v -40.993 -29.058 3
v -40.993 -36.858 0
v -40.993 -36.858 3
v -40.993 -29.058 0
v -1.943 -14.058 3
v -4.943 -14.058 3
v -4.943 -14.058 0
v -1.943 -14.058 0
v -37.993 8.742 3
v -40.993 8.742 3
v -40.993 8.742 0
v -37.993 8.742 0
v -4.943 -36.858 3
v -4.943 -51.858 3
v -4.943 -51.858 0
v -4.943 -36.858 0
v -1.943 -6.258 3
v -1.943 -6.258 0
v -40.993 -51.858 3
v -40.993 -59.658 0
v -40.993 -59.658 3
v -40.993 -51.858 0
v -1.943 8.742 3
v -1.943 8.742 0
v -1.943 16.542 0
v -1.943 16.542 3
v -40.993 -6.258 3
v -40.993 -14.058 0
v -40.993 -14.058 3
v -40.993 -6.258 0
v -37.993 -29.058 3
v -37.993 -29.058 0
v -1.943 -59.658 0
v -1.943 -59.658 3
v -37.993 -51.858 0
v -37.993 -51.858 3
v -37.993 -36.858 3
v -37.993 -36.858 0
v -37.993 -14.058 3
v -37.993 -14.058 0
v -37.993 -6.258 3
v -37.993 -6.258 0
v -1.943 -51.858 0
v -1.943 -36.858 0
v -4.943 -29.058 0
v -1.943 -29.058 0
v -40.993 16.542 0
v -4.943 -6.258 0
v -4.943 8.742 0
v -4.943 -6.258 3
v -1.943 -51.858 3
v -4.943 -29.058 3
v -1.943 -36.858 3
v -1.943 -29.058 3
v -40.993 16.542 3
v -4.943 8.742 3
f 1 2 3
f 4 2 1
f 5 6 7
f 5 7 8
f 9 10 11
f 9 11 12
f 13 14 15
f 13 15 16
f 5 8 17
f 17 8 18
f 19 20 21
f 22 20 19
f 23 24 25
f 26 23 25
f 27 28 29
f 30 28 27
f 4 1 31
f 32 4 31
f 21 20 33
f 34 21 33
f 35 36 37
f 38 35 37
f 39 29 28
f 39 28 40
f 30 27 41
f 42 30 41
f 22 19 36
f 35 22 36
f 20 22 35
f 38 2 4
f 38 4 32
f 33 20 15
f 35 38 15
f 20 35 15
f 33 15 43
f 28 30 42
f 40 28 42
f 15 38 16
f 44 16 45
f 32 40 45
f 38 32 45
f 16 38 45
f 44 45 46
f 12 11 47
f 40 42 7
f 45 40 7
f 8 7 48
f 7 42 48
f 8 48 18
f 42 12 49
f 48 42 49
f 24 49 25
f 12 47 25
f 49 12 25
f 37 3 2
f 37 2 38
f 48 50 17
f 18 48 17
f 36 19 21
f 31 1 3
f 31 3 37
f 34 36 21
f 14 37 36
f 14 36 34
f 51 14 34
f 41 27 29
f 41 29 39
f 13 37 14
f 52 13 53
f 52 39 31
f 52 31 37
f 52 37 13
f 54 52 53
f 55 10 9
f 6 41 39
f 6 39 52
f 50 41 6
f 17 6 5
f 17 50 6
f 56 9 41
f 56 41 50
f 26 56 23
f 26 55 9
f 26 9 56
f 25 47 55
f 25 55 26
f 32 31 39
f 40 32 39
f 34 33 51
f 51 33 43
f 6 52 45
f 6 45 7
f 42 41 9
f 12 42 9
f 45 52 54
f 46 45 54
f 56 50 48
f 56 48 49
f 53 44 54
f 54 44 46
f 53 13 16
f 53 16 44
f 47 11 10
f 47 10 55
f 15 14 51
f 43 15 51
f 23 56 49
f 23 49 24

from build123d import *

# Parameters (mm, degrees)
SKETCH1_W           = 39.05
SKETCH1_H           = 76.2
BOSS_EXTRUDE1_DEPTH = 3
SKETCH2_W           = 3
SKETCH2_H           = 15
CUT_EXTRUDE1_DEPTH  = 73.446802019
LPATTERN1_COUNT     = 3
LPATTERN1_PITCH     = 22.8


with BuildPart() as part:
    # Sketch1 → Boss-Extrude1 (new body)
    with BuildSketch(Plane.XY):
        with Locations((-21.468460648, -21.557986111)):
            Rectangle(SKETCH1_W, SKETCH1_H)
    extrude(amount=BOSS_EXTRUDE1_DEPTH)

    # Sketch2 → Cut-Extrude1 (cut, through all)
    with BuildSketch(Plane.XY.offset(3)):
        with Locations((-39.493460648, 1.242013889)):
            Rectangle(SKETCH2_W, SKETCH2_H)
        with Locations((-3.443460648, 1.242013889)):
            Rectangle(SKETCH2_W, SKETCH2_H)
    cut_extrude1 = extrude(amount=-CUT_EXTRUDE1_DEPTH, mode=Mode.SUBTRACT)

    # LPattern1: Cut-Extrude1 ×3
    with Locations(*[(0, -i * LPATTERN1_PITCH, 0) for i in range(1, LPATTERN1_COUNT)]):
        add(cut_extrude1, mode=Mode.SUBTRACT)


solid = part.part
